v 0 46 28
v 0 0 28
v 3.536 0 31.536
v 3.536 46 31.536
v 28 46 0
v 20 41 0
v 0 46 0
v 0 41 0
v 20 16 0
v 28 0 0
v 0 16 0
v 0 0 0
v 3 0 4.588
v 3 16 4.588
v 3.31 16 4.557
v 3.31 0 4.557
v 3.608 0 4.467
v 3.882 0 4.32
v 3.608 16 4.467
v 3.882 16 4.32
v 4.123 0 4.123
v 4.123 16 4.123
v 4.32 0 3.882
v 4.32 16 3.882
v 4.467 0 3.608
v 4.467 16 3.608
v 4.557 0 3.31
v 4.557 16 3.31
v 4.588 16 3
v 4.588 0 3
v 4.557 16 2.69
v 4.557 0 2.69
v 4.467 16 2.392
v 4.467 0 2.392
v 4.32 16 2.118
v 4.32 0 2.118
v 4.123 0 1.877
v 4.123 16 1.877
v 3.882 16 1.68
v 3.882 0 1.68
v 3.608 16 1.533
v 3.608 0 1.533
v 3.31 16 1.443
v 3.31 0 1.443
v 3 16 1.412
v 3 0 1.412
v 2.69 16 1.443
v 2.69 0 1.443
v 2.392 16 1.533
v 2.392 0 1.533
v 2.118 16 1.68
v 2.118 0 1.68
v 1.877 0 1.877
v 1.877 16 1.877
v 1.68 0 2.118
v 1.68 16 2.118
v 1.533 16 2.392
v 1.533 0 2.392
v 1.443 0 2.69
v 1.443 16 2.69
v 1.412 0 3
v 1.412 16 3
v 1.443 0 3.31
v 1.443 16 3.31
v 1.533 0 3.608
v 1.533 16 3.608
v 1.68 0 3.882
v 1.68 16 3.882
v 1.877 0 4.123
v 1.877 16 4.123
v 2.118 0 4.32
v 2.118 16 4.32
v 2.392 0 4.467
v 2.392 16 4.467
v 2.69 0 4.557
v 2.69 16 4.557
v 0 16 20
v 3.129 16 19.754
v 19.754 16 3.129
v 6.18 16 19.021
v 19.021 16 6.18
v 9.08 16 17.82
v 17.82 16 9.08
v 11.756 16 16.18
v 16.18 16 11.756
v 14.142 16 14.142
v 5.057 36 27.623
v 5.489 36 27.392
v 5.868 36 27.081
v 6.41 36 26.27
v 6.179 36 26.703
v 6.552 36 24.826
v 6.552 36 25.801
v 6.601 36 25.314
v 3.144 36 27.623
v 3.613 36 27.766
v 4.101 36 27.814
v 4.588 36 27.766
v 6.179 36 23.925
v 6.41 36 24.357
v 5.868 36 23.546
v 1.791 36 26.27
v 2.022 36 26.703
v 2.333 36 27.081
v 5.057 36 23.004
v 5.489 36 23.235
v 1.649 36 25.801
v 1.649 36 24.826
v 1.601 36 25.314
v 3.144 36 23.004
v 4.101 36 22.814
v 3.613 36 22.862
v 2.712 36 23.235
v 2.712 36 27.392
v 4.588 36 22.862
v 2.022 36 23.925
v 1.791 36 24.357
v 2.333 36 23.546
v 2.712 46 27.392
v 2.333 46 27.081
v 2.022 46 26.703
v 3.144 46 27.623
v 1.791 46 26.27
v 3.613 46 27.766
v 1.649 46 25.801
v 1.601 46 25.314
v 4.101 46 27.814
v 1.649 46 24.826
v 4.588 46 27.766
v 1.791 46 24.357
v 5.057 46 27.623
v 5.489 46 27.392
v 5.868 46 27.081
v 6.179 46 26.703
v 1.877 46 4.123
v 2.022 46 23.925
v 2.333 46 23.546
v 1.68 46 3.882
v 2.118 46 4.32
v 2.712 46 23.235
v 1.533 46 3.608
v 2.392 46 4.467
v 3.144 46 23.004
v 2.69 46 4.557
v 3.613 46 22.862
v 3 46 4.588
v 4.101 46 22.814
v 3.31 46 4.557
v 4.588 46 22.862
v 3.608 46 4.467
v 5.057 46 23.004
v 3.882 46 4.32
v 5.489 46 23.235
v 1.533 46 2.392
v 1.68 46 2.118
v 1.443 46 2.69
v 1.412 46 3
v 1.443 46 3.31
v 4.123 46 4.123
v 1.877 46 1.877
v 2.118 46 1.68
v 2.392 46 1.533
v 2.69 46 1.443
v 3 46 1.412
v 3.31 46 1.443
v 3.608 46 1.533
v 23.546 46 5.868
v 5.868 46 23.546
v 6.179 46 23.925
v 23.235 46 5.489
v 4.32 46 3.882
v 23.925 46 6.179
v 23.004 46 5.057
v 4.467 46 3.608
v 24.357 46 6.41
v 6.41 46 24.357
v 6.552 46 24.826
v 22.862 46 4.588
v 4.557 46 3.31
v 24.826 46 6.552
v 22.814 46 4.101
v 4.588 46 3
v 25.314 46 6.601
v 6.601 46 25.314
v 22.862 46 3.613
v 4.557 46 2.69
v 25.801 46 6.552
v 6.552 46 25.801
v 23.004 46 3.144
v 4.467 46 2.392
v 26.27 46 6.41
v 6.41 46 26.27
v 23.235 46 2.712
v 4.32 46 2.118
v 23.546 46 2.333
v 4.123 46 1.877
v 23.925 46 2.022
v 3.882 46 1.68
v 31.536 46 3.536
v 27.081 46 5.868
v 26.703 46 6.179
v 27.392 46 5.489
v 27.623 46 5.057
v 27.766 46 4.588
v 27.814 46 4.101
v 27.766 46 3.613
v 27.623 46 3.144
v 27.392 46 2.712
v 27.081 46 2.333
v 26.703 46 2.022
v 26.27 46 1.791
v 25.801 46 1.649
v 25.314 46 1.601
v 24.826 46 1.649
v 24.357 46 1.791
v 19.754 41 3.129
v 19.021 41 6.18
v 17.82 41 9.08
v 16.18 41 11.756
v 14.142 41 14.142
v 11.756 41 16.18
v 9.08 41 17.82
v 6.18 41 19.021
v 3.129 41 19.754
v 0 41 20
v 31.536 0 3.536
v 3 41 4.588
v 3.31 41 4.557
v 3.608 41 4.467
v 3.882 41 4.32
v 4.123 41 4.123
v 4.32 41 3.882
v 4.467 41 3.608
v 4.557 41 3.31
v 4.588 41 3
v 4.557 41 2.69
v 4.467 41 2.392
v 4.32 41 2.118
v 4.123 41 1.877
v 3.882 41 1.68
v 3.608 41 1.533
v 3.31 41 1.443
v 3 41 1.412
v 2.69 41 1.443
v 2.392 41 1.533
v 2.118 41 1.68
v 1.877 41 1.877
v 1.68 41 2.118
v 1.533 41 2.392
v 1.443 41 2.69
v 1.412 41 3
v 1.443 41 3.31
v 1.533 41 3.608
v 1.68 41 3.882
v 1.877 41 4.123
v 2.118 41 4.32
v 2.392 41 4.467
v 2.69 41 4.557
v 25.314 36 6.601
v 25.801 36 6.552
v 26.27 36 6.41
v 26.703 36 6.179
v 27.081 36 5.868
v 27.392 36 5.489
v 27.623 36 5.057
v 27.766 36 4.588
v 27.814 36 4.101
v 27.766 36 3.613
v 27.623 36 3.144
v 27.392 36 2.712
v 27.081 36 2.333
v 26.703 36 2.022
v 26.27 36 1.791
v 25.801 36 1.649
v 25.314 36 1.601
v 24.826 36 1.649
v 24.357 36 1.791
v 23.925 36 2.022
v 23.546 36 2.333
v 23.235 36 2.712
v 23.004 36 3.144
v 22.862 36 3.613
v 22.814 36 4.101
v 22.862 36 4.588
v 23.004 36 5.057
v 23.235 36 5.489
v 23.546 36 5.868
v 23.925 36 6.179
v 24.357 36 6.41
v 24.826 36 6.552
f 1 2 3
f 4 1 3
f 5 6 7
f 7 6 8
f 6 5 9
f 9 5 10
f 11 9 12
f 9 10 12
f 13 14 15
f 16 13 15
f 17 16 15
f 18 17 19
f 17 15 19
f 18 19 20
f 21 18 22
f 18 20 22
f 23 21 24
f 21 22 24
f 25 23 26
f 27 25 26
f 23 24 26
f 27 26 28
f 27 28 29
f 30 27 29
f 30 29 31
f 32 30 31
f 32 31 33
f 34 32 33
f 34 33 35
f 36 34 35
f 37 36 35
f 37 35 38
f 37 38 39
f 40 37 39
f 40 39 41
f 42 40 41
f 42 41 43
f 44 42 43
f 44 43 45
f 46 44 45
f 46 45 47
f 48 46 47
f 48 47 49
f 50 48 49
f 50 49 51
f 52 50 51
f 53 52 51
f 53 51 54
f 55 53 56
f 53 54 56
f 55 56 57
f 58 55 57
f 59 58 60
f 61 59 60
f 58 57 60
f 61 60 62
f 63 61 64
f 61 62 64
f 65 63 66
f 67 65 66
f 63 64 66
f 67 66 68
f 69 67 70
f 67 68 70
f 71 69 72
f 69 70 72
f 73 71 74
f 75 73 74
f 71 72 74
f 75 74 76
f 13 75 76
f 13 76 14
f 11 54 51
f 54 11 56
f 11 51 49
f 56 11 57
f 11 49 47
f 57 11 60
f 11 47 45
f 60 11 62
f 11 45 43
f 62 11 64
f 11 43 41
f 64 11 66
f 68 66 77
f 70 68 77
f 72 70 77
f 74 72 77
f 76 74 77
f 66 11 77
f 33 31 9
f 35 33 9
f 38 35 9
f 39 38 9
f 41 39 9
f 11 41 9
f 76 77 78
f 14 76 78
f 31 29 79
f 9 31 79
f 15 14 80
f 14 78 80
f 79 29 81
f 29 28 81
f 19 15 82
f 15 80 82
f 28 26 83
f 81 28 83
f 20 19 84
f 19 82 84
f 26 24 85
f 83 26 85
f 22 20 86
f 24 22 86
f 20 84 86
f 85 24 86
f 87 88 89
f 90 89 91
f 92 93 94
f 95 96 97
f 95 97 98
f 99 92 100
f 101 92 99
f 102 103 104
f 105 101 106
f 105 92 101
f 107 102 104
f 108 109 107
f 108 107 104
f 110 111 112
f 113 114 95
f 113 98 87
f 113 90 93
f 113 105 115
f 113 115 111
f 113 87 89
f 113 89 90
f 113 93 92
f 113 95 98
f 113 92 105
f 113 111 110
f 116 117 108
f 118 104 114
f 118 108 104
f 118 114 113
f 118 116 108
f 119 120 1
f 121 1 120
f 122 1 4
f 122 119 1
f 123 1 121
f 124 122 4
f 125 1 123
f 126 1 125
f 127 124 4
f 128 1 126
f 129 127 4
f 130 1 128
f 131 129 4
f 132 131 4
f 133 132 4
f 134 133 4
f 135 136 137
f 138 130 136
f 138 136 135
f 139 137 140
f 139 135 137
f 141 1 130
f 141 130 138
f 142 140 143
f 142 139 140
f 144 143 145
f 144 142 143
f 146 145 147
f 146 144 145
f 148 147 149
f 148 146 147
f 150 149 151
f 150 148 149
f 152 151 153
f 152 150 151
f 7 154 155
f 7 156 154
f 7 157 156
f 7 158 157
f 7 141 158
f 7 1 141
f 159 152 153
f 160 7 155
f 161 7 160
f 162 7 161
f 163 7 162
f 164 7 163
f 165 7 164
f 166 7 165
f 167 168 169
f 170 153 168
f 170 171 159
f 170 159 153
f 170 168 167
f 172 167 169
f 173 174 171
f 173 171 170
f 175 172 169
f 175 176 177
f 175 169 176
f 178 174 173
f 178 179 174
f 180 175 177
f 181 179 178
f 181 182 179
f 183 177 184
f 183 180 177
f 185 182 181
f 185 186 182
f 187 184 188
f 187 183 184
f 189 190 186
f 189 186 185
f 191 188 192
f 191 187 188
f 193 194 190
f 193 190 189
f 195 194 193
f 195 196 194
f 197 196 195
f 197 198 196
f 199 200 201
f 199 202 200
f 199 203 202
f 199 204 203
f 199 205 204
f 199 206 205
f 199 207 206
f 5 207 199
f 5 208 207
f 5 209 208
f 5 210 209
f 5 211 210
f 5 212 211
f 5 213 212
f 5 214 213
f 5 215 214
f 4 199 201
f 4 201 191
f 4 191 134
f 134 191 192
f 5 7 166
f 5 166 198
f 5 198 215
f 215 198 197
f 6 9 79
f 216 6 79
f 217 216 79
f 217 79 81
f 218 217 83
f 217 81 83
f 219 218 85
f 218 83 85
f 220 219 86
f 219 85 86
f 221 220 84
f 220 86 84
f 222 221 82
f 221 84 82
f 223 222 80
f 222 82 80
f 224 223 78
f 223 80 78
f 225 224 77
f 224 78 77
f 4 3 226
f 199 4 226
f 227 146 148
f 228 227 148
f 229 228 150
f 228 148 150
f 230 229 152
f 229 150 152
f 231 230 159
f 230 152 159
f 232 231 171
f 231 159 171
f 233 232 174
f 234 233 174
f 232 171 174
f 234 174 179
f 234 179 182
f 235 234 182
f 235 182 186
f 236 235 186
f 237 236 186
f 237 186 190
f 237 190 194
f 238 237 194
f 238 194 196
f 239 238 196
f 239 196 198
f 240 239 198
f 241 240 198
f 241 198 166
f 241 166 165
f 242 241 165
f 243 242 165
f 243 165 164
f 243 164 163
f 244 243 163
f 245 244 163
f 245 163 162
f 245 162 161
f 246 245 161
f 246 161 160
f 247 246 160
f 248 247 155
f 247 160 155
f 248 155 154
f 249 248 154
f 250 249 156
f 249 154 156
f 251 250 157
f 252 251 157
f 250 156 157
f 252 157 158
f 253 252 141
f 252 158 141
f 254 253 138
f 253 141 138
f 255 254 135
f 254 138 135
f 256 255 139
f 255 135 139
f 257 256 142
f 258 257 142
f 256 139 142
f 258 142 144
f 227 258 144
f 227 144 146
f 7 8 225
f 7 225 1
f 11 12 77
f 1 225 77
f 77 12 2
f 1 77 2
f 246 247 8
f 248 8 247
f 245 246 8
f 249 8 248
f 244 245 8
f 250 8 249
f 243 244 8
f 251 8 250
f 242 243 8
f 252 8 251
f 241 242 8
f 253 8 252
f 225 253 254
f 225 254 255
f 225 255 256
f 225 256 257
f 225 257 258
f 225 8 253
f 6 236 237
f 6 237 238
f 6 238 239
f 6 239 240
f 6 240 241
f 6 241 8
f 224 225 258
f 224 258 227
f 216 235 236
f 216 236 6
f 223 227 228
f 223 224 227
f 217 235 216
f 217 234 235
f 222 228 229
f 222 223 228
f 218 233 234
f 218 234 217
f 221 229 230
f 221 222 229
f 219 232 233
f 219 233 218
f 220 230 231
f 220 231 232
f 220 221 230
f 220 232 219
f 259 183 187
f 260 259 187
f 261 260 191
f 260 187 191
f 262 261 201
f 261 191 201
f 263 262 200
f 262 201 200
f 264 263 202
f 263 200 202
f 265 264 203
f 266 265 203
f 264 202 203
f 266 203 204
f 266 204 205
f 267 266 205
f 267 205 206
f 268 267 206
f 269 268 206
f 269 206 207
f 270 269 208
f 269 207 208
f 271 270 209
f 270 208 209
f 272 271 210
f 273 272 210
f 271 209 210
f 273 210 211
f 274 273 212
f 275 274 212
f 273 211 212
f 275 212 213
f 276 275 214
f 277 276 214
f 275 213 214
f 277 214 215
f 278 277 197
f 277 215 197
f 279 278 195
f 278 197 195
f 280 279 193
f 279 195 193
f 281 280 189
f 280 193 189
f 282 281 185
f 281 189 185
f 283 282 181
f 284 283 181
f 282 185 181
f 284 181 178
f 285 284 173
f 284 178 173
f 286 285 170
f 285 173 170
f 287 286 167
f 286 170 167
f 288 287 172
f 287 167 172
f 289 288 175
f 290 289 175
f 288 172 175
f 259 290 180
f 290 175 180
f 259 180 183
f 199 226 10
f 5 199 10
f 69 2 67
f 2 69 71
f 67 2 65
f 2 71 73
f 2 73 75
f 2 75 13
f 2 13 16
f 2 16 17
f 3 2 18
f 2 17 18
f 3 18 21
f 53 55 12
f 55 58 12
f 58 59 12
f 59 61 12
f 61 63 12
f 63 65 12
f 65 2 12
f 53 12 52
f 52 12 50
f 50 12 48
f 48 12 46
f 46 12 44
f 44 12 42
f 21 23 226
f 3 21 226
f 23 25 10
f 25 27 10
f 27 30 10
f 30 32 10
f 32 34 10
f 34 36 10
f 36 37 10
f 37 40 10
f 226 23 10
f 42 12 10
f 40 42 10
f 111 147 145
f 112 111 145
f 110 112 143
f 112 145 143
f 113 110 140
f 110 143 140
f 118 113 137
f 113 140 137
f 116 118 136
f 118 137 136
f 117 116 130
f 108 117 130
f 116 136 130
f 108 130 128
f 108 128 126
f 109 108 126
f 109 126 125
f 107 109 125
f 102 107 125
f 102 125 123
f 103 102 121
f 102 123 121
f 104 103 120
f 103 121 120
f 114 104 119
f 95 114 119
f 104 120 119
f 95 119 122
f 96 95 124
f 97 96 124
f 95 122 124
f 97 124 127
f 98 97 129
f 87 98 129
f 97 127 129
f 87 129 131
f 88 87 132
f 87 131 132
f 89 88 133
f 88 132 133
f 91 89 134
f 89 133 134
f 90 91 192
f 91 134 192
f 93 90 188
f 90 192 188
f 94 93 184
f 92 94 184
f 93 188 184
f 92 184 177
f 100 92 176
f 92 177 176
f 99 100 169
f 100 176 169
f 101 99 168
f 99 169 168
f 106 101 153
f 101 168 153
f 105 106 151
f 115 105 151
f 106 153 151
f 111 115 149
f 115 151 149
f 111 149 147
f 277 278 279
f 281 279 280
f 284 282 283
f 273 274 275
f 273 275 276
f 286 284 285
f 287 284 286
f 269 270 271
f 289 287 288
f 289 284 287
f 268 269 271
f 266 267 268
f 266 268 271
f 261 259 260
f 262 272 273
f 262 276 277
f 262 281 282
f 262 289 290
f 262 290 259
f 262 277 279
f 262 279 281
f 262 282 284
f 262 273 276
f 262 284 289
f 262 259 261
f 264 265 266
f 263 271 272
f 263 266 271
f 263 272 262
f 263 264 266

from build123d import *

# Parameters (mm, degrees)
BOSS_EXTRUDE1_DEPTH = 46
CUT_EXTRUDE3_START  = -16
CUT_EXTRUDE3_DEPTH  = 25
SKETCH3_R           = 1.5875
CUT_EXTRUDE4_DEPTH  = 65.070116259
SKETCH5_R           = 2.5
CUT_EXTRUDE5_DEPTH  = 10


with BuildPart() as part:
    # Sketch1 → Boss-Extrude1 (new body)
    with BuildSketch(Plane(origin=(0, 0, 0), x_dir=(1, 0, 0), z_dir=(0, 1, 0))):
        Polygon((0, 0), (0, -28), (3.535533906, -31.535533906), (31.535533906, -3.535533906), (28, 0), align=None)
    extrude(amount=BOSS_EXTRUDE1_DEPTH)

    # Sketch2 → Cut-Extrude3 (cut)
    with BuildSketch(Plane.XZ.offset(CUT_EXTRUDE3_START)):
        with BuildLine():
            Line((0, 20), (0, 0))
            Line((0, 0), (20, 0))
            ThreePointArc((20, 0), (14.142135624, 14.142135624), (0, 20))
        make_face()
    extrude(amount=-CUT_EXTRUDE3_DEPTH, mode=Mode.SUBTRACT)

    # Sketch3 → Cut-Extrude4 (cut, through all)
    with BuildSketch(Plane(origin=(0, 46, 0), x_dir=(1, 0, 0), z_dir=(0, 1, 0))):
        with Locations(Location((3, -3, 0), (0, 0, 270))):
            Circle(SKETCH3_R)
    extrude(amount=-CUT_EXTRUDE4_DEPTH, mode=Mode.SUBTRACT)

    # Sketch5 → Cut-Extrude5 (cut)
    with BuildSketch(Plane(origin=(0, 46, 0), x_dir=(1, 0, 0), z_dir=(0, 1, 0))):
        with Locations(Location((25.313708499, -4.100505063, 0), (0, 0, 270))):
            Circle(SKETCH5_R)
        with Locations(Location((4.100505063, -25.313708499, 0), (0, 0, 90))):
            Circle(SKETCH5_R)
    extrude(amount=-CUT_EXTRUDE5_DEPTH, mode=Mode.SUBTRACT)


solid = part.part
